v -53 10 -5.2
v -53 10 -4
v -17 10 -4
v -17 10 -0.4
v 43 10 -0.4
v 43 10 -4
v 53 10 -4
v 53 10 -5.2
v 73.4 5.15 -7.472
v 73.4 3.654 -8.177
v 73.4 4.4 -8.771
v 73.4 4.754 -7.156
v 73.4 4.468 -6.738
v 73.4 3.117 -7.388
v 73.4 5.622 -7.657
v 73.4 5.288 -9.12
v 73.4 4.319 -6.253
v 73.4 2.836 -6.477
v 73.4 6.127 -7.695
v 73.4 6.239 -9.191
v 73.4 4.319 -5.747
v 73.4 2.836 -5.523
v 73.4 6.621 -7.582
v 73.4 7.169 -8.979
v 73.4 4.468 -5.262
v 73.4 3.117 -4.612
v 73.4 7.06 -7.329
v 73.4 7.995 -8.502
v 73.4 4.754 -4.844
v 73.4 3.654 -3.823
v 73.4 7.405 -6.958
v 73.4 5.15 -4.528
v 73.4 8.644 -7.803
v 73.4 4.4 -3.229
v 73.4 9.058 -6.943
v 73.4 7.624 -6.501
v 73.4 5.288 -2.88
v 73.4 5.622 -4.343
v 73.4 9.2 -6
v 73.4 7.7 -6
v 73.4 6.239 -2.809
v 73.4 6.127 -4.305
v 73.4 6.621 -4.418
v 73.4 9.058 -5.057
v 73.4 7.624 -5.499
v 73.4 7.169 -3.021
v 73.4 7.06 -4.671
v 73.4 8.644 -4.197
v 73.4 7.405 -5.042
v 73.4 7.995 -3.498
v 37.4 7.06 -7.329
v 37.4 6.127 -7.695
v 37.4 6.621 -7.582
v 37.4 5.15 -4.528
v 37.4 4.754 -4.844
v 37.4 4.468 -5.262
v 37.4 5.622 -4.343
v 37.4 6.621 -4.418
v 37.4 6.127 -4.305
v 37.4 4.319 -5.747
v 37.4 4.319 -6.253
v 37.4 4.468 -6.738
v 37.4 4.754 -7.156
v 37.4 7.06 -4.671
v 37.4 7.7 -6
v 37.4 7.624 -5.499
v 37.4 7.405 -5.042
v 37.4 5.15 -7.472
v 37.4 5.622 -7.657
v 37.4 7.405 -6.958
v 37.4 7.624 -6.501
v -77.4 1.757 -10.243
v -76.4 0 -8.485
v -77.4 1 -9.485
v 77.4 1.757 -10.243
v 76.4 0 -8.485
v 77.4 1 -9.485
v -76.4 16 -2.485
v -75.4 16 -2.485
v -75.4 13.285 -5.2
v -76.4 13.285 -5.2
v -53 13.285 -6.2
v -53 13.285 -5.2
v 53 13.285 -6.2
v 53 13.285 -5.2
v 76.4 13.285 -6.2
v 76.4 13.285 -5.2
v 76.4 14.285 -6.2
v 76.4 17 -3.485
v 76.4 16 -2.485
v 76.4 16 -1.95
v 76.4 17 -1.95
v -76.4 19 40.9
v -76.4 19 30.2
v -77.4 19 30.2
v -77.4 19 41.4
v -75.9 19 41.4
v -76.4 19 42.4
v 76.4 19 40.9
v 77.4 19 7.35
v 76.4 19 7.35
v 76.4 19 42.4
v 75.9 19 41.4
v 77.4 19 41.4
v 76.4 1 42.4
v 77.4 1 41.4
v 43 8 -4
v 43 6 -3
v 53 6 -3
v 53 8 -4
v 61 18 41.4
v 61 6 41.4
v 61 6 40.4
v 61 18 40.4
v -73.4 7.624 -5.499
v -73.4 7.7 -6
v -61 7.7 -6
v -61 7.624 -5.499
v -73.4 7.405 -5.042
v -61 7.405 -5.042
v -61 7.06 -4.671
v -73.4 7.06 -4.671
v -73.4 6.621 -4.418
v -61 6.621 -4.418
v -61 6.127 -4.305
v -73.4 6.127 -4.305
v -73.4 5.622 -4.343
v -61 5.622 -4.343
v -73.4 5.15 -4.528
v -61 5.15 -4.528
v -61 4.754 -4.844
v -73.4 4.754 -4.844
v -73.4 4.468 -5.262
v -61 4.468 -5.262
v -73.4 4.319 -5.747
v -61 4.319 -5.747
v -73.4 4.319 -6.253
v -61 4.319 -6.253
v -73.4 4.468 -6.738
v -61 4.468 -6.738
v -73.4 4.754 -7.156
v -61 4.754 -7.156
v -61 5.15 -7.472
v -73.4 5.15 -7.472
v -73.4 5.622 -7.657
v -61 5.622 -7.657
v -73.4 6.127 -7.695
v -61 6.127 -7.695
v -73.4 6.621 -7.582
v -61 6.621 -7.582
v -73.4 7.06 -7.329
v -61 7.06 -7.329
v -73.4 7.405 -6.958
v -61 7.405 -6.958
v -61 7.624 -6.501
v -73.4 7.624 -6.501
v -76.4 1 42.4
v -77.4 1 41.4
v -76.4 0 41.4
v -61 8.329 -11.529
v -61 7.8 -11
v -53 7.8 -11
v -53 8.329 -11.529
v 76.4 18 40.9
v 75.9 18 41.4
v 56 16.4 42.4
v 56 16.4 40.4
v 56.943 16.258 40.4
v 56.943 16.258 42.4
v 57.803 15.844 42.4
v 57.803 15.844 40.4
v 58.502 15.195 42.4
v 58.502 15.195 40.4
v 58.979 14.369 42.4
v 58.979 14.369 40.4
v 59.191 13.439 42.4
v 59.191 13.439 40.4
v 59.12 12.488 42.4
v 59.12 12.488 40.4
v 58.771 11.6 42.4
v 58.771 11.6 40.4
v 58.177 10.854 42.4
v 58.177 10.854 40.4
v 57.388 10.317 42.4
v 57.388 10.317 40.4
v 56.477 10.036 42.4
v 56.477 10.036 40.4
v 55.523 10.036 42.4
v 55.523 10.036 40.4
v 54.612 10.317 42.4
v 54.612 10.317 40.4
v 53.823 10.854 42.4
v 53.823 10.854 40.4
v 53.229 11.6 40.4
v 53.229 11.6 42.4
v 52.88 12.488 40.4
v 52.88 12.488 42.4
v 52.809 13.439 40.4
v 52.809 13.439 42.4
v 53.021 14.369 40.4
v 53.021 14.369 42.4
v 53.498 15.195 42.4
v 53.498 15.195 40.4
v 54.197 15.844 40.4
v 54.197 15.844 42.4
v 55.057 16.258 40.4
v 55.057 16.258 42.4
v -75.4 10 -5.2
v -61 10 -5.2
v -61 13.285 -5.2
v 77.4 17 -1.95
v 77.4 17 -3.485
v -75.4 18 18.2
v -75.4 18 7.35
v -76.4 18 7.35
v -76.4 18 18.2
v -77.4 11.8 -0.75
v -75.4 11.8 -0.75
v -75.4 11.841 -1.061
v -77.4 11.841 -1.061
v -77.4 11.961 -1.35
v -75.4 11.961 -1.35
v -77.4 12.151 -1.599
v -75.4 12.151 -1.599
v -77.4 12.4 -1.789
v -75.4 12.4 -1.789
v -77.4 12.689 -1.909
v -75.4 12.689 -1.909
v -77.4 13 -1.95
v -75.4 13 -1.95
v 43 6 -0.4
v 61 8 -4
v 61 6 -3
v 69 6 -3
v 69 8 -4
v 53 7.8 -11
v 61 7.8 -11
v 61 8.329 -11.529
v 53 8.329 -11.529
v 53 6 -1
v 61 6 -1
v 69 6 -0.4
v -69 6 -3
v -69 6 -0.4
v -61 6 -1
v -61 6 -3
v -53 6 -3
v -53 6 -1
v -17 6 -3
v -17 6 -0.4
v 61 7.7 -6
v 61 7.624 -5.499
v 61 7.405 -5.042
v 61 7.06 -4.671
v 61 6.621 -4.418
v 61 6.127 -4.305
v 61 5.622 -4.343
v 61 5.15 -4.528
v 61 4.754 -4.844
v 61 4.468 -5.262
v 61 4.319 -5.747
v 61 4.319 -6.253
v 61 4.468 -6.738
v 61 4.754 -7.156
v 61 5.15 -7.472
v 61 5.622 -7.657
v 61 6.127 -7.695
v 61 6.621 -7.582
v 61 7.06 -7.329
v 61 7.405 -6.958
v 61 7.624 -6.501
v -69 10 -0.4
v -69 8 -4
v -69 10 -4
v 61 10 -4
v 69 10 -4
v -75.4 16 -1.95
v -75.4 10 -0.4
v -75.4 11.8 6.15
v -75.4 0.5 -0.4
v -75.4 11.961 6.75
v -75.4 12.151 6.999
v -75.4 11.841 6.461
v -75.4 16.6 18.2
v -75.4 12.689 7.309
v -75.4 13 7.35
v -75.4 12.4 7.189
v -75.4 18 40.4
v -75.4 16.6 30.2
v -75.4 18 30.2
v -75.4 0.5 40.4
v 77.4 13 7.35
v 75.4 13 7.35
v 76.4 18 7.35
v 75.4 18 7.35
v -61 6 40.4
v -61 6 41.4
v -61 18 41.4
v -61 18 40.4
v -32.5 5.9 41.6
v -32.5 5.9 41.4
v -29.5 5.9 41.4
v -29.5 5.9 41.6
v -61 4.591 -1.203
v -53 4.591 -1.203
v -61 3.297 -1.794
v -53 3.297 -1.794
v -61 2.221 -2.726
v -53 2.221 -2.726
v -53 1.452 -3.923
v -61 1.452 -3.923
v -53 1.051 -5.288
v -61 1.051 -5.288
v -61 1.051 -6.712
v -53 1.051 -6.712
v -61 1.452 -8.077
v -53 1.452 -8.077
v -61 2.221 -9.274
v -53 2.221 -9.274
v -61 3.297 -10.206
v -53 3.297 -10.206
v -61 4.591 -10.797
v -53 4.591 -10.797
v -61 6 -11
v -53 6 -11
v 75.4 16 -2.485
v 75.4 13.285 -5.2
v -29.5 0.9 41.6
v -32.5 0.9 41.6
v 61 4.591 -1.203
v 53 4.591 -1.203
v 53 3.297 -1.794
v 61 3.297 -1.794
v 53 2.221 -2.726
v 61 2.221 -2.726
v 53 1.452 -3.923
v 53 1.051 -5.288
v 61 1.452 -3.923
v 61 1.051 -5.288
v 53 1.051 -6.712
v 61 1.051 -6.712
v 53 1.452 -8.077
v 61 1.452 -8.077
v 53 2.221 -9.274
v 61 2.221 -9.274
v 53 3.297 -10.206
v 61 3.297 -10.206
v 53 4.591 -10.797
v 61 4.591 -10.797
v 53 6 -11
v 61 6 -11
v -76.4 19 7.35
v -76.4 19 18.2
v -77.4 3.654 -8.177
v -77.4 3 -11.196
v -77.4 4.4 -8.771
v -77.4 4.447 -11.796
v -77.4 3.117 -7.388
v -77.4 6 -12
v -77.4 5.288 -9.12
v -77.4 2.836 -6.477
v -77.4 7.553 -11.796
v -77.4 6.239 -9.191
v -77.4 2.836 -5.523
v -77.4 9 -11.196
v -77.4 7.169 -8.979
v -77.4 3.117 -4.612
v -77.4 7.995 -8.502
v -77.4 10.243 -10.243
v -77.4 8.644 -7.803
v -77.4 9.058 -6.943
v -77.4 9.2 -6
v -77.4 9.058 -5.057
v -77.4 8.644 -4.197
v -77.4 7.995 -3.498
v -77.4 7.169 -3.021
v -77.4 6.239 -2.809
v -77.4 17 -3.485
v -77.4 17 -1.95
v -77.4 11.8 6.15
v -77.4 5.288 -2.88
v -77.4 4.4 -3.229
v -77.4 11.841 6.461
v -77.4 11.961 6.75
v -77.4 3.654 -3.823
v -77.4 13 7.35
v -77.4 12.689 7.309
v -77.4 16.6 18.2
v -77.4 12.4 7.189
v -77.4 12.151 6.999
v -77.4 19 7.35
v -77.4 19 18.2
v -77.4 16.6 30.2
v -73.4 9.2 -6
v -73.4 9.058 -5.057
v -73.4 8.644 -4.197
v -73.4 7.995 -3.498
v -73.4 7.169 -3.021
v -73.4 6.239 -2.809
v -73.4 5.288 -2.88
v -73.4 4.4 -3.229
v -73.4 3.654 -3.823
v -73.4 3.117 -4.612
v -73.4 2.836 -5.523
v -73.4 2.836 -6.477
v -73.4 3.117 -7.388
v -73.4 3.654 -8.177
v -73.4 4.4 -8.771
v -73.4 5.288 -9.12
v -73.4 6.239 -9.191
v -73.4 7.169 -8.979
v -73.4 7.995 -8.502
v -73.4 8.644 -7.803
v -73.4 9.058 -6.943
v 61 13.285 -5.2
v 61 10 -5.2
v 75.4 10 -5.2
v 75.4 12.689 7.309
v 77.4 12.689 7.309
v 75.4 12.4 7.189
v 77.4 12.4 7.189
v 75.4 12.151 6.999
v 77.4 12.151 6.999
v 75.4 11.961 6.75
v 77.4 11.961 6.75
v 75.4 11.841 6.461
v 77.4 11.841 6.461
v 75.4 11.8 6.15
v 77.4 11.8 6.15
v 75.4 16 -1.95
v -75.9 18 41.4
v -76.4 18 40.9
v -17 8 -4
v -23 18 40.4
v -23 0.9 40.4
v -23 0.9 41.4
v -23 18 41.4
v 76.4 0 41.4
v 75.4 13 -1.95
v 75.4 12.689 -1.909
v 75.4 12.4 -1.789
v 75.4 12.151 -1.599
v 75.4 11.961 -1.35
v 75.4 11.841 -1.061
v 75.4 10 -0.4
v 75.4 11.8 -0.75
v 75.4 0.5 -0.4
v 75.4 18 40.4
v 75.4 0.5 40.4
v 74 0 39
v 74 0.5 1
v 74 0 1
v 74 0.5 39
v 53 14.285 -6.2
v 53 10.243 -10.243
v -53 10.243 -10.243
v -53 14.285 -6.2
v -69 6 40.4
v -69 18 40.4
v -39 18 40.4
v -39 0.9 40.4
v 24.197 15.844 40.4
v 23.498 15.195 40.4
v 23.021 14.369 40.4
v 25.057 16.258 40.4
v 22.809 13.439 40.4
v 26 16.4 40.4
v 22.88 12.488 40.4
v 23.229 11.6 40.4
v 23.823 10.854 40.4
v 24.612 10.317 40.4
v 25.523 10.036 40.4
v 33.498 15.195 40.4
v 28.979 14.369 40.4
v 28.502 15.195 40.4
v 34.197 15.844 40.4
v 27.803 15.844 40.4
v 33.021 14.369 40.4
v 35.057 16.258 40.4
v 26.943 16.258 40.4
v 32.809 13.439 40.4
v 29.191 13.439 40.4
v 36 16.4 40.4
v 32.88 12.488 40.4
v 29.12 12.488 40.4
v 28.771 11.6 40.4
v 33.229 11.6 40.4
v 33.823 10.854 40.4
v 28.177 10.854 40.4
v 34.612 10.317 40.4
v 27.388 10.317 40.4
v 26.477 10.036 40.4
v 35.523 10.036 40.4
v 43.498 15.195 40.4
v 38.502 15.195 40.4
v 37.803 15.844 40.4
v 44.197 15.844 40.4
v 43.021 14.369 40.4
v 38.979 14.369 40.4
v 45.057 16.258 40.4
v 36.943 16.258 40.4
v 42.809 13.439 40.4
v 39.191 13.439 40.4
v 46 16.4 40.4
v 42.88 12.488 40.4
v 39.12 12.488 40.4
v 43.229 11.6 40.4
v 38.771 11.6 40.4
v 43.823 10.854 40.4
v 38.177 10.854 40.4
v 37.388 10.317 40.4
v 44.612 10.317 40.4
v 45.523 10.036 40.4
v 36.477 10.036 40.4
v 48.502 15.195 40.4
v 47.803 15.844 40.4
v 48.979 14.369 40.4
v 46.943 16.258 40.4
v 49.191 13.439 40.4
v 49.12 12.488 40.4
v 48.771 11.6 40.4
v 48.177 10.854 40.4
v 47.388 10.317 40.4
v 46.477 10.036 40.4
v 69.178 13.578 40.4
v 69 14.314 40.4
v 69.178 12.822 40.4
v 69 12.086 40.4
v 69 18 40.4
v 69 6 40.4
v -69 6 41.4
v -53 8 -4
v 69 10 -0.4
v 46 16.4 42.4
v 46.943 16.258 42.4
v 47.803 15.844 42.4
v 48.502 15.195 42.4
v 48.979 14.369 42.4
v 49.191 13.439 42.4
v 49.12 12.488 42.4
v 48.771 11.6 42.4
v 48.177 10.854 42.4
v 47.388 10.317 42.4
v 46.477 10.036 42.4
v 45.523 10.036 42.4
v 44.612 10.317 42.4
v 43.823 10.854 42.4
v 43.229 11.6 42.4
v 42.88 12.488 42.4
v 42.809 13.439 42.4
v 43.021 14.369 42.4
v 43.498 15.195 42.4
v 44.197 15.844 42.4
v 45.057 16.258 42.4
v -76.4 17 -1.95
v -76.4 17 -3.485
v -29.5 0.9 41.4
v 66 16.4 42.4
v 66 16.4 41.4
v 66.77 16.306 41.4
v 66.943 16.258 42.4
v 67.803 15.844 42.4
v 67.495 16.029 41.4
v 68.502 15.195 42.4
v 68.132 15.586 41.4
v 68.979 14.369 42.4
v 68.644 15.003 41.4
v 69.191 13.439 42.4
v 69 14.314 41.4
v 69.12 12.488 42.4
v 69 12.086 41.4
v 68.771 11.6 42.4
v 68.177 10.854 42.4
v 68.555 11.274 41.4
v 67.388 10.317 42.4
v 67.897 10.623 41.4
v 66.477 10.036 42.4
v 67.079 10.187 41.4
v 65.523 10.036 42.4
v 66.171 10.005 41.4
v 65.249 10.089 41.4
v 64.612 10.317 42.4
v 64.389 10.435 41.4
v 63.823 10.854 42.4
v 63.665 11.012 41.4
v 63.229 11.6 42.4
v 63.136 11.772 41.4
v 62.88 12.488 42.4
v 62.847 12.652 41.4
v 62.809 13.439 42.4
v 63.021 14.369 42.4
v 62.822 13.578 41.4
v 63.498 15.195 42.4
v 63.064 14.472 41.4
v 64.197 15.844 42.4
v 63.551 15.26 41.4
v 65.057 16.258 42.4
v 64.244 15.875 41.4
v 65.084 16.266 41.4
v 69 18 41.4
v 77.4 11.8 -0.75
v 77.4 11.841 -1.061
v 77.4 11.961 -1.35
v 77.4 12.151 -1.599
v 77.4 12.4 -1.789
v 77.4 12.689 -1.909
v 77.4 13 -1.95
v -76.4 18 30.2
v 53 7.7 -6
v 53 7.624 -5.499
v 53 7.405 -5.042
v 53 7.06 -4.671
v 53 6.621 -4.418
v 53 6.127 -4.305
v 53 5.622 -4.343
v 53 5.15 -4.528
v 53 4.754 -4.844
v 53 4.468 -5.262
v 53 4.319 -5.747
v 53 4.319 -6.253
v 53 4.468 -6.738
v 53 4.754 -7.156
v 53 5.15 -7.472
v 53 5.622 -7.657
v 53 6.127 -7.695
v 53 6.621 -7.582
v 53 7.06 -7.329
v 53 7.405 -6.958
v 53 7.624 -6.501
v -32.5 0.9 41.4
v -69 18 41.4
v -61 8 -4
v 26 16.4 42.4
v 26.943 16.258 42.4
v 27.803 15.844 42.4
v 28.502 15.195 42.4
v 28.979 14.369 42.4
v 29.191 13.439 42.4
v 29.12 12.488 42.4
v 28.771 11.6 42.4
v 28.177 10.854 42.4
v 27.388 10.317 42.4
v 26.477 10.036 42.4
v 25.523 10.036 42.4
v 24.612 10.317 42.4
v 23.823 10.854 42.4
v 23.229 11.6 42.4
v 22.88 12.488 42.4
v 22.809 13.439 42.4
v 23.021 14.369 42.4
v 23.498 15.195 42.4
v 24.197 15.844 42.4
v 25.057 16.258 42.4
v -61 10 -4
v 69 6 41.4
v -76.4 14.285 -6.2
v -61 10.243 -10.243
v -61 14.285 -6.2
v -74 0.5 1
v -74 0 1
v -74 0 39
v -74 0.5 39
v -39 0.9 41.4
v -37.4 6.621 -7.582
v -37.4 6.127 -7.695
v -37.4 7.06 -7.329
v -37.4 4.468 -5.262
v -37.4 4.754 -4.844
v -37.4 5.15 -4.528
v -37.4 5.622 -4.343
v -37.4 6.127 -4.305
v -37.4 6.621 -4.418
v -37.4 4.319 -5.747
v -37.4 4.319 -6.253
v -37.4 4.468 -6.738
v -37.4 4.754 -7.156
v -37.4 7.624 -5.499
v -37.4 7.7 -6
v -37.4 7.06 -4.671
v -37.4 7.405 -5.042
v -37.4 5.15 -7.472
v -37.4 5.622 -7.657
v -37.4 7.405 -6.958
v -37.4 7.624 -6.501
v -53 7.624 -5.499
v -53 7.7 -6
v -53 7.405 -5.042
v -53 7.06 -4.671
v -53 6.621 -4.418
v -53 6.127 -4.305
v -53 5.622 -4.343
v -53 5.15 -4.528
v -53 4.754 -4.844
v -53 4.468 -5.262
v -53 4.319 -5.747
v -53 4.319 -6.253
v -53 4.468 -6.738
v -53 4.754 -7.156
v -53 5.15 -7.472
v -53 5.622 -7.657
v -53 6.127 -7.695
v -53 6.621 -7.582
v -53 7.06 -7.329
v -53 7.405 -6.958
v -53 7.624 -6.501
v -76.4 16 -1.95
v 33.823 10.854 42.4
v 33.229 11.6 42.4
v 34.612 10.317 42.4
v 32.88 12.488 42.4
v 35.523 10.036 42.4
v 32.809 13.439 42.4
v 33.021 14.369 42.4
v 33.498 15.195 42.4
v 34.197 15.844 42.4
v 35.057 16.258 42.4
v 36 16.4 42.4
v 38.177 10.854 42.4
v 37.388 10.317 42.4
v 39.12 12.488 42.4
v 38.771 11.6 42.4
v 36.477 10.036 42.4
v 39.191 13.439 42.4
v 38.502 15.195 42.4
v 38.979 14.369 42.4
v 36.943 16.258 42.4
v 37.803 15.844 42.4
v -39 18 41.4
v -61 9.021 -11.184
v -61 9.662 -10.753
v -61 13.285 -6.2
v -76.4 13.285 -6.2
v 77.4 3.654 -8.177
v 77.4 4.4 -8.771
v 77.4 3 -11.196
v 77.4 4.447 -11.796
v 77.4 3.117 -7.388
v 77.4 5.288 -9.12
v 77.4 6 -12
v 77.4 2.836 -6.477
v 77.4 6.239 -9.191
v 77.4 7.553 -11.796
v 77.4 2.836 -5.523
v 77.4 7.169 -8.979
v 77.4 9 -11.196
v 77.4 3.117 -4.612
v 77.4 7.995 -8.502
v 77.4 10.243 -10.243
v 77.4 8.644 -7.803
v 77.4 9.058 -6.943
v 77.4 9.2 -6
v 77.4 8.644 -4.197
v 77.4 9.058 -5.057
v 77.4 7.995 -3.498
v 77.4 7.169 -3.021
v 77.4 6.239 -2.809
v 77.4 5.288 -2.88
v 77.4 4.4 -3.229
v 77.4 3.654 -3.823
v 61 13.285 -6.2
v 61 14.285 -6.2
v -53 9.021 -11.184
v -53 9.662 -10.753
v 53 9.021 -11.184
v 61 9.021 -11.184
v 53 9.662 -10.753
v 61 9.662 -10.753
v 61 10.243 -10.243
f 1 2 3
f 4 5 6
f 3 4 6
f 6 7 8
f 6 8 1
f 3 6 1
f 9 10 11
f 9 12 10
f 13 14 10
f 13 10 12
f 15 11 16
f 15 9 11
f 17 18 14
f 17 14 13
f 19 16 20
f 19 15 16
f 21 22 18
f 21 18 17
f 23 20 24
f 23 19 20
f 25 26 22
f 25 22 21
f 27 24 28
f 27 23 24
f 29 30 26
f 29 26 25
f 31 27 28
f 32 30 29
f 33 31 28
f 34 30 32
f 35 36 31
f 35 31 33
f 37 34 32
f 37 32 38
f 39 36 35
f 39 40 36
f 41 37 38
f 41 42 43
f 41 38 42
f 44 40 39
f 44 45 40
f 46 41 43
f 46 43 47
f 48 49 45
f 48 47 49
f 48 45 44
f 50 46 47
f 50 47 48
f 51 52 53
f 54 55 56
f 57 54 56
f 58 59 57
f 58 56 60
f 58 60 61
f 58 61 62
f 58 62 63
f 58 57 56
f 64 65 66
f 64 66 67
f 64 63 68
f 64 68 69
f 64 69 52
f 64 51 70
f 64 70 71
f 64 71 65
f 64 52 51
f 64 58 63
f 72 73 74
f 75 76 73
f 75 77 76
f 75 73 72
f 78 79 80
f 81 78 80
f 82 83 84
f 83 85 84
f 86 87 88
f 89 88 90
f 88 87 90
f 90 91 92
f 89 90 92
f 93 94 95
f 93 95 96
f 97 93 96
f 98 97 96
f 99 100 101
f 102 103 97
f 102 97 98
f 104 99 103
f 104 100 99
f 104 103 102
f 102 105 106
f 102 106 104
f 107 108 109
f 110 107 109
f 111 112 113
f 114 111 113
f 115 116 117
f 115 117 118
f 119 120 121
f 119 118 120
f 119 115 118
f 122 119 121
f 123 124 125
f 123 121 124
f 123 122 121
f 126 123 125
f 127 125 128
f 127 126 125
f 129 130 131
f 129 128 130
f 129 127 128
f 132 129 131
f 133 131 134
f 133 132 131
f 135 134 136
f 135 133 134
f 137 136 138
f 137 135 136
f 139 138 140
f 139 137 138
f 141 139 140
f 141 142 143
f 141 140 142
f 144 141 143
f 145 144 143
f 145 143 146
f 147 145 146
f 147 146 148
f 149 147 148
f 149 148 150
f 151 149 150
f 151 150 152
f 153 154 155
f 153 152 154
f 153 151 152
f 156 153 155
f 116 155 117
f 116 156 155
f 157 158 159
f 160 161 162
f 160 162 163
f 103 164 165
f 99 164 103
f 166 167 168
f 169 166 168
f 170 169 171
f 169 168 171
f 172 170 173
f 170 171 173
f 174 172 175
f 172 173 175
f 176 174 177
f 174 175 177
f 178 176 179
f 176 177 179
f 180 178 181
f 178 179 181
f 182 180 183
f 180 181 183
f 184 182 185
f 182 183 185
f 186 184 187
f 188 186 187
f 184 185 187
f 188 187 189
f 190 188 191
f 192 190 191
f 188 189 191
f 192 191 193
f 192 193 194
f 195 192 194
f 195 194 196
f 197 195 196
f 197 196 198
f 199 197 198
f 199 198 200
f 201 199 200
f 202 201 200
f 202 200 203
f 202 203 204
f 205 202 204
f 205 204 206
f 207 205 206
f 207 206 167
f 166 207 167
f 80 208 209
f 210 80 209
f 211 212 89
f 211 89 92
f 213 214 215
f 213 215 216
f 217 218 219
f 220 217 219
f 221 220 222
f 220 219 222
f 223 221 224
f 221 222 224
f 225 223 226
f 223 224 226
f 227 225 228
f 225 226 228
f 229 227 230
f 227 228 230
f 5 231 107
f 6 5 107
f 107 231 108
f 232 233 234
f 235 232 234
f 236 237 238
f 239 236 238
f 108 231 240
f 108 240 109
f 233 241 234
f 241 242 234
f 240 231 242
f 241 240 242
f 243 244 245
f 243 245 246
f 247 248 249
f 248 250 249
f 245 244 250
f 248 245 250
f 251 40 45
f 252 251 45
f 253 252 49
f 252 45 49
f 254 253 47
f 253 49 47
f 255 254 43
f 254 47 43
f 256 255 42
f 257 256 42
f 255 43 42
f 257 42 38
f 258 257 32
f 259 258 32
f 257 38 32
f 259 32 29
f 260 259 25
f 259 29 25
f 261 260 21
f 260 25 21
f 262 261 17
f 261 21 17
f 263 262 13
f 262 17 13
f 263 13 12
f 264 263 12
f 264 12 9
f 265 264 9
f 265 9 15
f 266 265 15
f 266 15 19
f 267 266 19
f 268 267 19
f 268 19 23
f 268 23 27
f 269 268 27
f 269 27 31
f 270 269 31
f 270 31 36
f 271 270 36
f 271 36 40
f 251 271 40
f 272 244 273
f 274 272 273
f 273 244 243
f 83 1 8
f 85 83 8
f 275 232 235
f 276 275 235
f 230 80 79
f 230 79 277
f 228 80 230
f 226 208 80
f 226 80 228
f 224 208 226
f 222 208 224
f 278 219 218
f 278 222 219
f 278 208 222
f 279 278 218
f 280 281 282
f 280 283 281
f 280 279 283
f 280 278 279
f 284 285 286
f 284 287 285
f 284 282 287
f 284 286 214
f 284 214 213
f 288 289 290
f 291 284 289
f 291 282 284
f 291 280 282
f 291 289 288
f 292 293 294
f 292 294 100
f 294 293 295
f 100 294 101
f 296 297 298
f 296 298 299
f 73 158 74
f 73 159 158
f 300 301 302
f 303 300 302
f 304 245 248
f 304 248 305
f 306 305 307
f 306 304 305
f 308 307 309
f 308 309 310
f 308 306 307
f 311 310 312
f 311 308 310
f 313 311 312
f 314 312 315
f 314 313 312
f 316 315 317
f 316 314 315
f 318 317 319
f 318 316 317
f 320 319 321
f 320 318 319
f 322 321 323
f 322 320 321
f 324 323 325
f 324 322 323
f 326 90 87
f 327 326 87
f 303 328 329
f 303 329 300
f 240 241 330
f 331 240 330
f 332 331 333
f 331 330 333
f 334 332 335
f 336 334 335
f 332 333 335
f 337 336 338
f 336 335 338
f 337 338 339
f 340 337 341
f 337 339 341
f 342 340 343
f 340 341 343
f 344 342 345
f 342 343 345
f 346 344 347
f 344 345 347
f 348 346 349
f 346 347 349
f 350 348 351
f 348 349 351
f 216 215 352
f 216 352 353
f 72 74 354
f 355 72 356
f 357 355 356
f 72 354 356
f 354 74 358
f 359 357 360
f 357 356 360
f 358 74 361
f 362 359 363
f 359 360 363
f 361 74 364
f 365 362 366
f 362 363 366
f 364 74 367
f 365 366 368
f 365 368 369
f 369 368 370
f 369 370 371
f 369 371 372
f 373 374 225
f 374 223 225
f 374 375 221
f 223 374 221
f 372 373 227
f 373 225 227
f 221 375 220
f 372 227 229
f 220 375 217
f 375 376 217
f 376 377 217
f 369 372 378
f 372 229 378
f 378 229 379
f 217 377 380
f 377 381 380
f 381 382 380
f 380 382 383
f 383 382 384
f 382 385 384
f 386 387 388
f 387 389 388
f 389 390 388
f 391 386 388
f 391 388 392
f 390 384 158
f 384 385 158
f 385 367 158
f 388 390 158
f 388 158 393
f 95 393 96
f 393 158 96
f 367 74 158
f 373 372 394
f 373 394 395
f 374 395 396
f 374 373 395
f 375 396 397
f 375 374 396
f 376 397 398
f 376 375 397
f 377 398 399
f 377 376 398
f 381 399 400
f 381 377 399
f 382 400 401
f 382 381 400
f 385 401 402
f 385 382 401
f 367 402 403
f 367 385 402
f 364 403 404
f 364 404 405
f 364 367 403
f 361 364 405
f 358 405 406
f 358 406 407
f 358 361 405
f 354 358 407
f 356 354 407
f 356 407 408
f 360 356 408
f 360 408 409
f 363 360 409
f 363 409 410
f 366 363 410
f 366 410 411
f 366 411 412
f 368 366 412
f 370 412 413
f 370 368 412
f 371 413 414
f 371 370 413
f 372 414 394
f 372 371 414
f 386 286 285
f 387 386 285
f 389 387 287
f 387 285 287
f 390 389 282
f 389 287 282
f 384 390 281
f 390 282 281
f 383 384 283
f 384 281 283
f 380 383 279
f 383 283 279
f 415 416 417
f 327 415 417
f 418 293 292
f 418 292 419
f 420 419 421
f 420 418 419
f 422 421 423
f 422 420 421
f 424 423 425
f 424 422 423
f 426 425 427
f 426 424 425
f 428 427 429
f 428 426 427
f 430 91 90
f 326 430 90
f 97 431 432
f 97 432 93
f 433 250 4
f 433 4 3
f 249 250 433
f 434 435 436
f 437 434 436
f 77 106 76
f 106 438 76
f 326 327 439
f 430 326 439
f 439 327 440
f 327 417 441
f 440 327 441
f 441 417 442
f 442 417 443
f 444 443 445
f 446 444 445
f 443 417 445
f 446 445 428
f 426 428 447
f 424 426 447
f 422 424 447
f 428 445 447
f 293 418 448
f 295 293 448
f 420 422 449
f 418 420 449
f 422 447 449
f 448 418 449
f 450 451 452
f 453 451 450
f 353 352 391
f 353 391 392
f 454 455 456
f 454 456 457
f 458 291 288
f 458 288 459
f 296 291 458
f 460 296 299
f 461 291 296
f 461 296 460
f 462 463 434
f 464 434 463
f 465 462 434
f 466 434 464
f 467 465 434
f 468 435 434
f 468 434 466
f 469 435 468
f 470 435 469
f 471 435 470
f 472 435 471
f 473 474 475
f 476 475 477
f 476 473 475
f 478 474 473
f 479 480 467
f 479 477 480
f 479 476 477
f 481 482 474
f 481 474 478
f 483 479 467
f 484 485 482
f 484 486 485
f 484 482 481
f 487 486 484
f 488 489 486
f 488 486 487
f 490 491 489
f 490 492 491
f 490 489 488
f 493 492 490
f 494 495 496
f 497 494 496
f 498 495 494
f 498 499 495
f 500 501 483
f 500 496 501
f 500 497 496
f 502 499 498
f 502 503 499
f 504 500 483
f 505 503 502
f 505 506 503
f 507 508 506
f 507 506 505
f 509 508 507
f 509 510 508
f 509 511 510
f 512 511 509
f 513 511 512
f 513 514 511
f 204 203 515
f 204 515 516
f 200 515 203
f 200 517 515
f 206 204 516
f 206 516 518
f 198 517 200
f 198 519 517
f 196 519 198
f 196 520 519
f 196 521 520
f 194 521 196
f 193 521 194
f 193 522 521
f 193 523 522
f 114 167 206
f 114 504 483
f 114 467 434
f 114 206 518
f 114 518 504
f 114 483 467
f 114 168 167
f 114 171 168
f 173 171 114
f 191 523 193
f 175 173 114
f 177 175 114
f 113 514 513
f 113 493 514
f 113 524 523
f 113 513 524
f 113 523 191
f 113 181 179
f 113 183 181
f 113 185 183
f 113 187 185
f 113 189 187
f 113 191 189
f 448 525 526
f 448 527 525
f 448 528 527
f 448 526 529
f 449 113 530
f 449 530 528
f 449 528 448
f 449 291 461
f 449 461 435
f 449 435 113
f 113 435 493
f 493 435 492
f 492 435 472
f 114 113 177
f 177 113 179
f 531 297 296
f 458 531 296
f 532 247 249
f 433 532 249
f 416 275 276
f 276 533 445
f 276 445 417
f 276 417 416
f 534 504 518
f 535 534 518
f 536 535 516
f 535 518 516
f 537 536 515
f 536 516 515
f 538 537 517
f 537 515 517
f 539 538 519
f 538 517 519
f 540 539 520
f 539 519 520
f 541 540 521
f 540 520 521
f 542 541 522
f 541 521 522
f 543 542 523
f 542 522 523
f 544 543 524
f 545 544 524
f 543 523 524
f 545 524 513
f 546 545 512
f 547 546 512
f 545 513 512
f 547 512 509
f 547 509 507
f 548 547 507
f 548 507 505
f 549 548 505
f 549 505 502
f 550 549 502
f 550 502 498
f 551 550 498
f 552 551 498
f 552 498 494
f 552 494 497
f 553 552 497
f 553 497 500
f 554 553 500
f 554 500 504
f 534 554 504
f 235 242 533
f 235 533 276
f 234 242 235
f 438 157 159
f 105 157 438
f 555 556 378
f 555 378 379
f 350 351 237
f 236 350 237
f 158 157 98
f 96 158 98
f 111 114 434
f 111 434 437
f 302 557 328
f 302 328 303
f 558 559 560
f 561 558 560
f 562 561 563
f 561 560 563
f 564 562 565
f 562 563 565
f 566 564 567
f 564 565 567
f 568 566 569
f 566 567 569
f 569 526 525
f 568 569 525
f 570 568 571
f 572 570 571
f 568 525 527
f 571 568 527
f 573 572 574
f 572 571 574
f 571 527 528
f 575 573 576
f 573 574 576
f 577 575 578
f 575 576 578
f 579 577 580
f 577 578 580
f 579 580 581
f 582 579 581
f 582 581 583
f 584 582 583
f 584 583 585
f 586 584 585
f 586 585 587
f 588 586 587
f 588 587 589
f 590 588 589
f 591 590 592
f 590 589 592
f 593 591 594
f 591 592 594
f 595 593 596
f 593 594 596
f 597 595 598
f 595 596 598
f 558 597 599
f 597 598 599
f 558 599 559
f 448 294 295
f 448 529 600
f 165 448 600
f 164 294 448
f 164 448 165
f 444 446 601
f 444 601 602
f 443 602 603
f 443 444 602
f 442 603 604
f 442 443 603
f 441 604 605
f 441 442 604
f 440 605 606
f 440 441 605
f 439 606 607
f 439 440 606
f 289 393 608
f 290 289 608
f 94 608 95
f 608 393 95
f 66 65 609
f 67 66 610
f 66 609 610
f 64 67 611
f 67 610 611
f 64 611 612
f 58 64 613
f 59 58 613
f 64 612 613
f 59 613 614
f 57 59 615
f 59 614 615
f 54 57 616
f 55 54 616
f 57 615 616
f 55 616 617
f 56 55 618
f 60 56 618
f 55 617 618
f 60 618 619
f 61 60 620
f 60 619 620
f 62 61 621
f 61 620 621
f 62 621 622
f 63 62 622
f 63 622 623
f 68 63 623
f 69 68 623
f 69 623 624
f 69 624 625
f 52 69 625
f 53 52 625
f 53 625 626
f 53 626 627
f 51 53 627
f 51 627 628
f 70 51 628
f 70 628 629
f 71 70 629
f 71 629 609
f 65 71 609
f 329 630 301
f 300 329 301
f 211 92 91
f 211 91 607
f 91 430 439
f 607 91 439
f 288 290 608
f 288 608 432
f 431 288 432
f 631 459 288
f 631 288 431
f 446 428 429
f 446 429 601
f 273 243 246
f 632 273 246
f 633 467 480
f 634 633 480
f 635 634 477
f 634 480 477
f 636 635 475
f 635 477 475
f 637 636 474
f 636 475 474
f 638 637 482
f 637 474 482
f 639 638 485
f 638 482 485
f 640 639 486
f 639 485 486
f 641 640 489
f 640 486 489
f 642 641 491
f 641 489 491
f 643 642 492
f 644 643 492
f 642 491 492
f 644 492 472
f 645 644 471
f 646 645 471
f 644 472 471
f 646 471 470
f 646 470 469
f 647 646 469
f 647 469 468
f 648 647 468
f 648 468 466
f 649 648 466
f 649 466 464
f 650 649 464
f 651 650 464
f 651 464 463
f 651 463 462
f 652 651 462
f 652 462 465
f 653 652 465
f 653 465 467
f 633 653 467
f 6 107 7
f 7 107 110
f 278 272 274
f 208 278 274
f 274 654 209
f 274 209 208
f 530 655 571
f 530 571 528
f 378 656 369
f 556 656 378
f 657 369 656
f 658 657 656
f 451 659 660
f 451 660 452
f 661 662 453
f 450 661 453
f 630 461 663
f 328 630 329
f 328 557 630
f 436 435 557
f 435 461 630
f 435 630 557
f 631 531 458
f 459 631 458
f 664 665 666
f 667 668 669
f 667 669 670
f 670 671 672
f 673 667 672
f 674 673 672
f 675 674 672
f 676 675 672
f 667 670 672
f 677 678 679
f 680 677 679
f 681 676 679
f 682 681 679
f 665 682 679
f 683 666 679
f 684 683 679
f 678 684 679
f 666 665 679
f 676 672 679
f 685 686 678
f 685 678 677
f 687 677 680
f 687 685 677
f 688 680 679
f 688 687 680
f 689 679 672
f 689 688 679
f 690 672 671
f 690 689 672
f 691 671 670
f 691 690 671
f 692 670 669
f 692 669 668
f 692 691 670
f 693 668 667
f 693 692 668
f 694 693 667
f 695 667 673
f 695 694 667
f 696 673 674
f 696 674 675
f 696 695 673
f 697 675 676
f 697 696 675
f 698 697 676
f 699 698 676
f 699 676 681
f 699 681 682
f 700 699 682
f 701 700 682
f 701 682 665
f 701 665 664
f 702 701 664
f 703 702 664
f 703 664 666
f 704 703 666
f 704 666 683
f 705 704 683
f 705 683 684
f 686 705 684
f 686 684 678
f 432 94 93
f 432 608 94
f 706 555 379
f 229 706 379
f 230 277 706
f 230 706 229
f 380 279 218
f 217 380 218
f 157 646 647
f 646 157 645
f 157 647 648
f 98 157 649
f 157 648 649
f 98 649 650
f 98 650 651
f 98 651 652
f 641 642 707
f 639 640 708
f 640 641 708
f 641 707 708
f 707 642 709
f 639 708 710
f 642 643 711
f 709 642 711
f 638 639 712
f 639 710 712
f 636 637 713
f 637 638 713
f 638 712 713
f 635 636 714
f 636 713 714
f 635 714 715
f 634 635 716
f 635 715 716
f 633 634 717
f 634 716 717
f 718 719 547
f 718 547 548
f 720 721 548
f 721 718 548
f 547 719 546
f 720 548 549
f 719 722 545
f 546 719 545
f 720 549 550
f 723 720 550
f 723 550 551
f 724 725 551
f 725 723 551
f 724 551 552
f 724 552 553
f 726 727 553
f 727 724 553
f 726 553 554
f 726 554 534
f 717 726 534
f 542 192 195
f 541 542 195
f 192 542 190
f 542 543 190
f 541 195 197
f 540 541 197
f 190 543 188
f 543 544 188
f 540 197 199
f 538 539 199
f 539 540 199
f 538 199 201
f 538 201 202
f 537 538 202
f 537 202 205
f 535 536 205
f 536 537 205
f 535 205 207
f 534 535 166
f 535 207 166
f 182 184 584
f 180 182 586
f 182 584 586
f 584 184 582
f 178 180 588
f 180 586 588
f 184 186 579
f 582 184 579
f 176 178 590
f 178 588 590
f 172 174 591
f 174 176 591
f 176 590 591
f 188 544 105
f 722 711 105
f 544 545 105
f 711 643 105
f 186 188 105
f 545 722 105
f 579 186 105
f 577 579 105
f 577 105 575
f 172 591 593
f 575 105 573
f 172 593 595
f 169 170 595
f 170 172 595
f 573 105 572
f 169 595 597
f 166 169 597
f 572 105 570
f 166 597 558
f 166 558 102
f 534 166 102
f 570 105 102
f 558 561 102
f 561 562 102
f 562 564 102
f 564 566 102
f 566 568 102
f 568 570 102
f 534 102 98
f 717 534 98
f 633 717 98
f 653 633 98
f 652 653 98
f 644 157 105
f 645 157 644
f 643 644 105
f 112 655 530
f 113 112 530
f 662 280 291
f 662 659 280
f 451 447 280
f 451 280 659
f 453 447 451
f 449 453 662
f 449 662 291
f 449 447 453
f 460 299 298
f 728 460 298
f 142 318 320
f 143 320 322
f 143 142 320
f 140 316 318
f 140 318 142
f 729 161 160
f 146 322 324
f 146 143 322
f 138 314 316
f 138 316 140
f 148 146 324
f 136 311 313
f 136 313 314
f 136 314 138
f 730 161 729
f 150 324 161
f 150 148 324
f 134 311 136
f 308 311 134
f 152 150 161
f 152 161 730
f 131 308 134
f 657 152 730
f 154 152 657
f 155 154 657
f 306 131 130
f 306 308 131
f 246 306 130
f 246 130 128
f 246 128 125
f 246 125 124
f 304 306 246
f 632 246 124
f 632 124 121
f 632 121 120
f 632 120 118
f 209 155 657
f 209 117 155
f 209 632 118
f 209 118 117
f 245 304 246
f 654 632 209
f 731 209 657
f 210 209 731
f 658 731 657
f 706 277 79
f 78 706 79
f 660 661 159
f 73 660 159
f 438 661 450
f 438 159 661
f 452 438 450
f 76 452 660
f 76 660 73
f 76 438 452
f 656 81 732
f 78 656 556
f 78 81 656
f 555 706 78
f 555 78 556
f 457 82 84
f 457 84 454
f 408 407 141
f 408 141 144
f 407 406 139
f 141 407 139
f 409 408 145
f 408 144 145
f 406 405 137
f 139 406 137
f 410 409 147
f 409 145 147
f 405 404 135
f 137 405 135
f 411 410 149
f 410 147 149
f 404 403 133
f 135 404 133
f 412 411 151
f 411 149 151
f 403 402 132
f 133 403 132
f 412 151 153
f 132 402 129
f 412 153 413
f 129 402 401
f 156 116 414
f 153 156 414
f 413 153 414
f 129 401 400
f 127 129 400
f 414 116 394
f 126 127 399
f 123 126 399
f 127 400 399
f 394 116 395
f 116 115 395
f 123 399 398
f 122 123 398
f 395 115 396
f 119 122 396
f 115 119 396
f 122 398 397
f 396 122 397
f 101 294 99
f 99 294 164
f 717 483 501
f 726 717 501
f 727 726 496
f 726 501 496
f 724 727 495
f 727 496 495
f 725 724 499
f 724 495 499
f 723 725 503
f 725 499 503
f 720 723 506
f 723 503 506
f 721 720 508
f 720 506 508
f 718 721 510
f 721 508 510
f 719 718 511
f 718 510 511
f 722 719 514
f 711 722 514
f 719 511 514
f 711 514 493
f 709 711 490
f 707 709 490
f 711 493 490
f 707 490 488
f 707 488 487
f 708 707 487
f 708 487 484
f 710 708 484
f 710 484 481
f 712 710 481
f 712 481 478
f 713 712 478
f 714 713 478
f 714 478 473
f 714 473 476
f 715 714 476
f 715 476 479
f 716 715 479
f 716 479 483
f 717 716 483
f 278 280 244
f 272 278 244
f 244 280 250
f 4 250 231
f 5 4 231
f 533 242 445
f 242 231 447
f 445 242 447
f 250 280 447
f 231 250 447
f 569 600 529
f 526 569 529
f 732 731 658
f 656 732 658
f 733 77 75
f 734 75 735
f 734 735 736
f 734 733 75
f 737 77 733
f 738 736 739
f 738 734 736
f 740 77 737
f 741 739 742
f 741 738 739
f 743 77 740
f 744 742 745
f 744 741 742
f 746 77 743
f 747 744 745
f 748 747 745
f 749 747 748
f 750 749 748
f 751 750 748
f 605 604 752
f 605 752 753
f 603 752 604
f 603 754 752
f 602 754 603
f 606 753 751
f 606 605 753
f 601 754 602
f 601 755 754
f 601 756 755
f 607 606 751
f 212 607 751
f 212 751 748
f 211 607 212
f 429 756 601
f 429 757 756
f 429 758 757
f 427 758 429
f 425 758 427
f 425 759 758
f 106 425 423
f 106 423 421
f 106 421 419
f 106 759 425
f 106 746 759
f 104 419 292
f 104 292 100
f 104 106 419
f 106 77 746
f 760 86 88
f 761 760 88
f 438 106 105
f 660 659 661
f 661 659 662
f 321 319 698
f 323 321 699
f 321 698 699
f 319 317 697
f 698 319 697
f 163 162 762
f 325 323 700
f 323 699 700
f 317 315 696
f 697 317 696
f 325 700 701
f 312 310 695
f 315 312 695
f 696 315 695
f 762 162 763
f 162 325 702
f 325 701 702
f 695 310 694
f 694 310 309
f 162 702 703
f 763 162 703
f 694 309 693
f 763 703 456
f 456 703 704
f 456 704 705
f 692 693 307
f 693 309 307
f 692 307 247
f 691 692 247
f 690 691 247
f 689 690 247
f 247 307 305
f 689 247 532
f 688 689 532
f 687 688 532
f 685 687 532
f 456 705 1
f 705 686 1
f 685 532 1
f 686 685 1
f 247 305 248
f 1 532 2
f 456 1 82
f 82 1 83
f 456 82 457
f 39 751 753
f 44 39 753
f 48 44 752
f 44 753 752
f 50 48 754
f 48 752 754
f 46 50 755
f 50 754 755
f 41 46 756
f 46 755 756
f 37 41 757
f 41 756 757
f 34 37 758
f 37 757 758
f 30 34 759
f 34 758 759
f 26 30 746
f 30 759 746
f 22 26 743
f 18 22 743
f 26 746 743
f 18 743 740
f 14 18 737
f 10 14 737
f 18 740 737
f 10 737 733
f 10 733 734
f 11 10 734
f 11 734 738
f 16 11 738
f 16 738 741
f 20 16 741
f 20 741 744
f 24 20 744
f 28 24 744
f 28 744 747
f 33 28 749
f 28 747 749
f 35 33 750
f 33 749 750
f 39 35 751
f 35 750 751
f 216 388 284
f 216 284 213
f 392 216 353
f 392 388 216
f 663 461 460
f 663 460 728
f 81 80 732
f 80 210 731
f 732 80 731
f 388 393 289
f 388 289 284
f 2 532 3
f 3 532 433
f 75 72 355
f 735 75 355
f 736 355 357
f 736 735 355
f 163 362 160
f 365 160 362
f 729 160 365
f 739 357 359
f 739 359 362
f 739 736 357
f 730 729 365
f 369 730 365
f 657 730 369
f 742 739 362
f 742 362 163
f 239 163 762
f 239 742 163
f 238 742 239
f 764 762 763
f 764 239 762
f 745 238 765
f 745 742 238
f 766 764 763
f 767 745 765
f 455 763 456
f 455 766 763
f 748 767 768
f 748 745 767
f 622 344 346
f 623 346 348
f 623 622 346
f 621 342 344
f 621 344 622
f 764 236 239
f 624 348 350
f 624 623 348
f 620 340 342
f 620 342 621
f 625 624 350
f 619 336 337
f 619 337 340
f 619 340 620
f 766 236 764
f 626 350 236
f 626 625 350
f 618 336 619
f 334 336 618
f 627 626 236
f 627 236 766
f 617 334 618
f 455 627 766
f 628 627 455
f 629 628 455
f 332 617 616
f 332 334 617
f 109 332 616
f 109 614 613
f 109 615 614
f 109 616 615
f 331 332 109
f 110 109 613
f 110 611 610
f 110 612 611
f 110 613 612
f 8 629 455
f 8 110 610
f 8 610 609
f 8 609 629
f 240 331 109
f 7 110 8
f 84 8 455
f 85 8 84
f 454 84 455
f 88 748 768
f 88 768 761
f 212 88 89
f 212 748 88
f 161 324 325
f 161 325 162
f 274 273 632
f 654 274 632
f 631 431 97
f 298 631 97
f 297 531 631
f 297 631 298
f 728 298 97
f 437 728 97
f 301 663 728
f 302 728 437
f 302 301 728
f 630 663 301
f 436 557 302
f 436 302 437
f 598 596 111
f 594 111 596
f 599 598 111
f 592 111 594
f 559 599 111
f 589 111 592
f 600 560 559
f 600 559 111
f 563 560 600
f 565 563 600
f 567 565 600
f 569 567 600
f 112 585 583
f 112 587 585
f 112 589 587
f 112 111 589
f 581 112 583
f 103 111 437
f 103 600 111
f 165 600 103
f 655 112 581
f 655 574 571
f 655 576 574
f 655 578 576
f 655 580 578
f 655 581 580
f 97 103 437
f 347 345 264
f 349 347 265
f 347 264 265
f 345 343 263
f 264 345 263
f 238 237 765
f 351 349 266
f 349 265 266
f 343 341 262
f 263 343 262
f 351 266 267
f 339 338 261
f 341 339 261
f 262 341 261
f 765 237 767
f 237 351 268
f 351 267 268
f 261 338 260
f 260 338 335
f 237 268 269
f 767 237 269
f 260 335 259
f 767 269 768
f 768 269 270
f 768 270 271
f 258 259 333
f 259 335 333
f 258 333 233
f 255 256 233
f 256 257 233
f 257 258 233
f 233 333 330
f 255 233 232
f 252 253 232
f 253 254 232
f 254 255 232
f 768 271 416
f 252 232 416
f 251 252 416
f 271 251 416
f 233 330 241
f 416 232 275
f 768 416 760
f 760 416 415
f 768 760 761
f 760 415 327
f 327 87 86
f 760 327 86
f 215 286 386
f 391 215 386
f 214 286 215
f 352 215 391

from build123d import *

# Parameters (mm, degrees)
PAD_DEPTH            = 77.4
SKETCH002_W          = 40
SKETCH002_H          = 150
POCKET_DEPTH         = 18.501
SKETCH005_W          = 38
SKETCH005_H          = 148
POCKET003_DEPTH      = 0.501
SKETCH021_W          = 40.8
SKETCH021_H          = 150.8
POCKET018_DEPTH      = 18.501
SKETCH003_W          = 4
SKETCH003_H          = 8
SKETCH003_H_2        = 10
SKETCH003_H_3        = 36
SKETCH003_W_2        = 1.4
POCKET001_DEPTH      = 13.001
CHAMFER_1_SIZE2      = 1
CHAMFER_1_SIZE       = 2
CHAMFER_2_SIZE2      = 1
CHAMFER_2_SIZE       = 2
CHAMFER_3_SIZE2      = 1
CHAMFER_3_SIZE       = 2
CHAMFER_4_SIZE2      = 1
CHAMFER_4_SIZE       = 2
SKETCH004_W          = 4.8
SKETCH004_H          = 150
POCKET002_DEPTH      = 9.001
SKETCH022_W          = 5.2
SKETCH022_H          = 150.8
POCKET019_DEPTH      = 9.001
POCKET009_DEPTH      = 8
SKETCH013_R          = 1.7
POCKET010_DEPTH      = 40
SKETCH014_R          = 3.2
POCKET011_DEPTH      = 4
SKETCH006_W          = 1
SKETCH006_H          = 16
POCKET004_DEPTH      = 17.1
SKETCH020_W          = 5
SKETCH020_H          = 3
POCKET017_DEPTH      = 0.2
POCKET005_DEPTH      = 77.401
POCKET005_DEPTH_BACK = 77.401
SKETCH016_W          = 5
SKETCH016_H          = 12
POCKET012_DEPTH      = 10
SKETCH008_W          = 40
SKETCH008_H          = 152.8
POCKET006_DEPTH      = 1.001
SKETCH023_W          = 30
SKETCH023_H          = 170
POCKET020_DEPTH      = 2
POCKET007_DEPTH      = 76.4
SKETCH010_R          = 3.2
POCKET008_DEPTH      = 2.401
CHAMFER001_SIZE      = 1
CHAMFER002_SIZE      = 0.5


with BuildPart() as part:
    # Sketch001 → Pad (new body, symmetric)
    with BuildSketch(Plane.YZ):
        with BuildLine():
            Line((19, -1.485281), (19, 42.4))
            Line((0, 42.4), (19, 42.4))
            Line((0, 42.4), (0, 0))
            Line((0, 0), (0, -8.485281))
            Line((0, -8.485281), (1.757359, -10.242641))
            ThreePointArc((1.757359, -10.242641), (6, -12), (10.242641, -10.242641))
            Line((10.242641, -10.242641), (19, -1.485281))
        make_face()
    extrude(amount=PAD_DEPTH, both=True)

    # Sketch002 (on Face3 of Pad) → Pocket (cut, through all)
    with BuildSketch(Plane(origin=(0, 0.5, 0), x_dir=(0, 0, -1), z_dir=(0, -1, 0))):
        with Locations((-20, 0)):
            Rectangle(SKETCH002_W, SKETCH002_H)
    extrude(amount=-POCKET_DEPTH, mode=Mode.SUBTRACT)

    # Sketch005 (on Face14 of Pocket) → Pocket003 (cut, through all)
    with BuildSketch(Plane.ZX.offset(0.5)):
        with Locations((20, 0)):
            Rectangle(SKETCH005_W, SKETCH005_H)
    extrude(amount=-POCKET003_DEPTH, mode=Mode.SUBTRACT)

    # Sketch021 (on Face14 of Pocket) → Pocket018 (cut, through all)
    with BuildSketch(Plane.ZX.offset(0.5)):
        with Locations((20, 0)):
            Rectangle(SKETCH021_W, SKETCH021_H)
    extrude(amount=POCKET018_DEPTH, mode=Mode.SUBTRACT)

    # Sketch003 (on Face3 of Pad) → Pocket001 (cut, through all)
    with BuildSketch(Plane(origin=(0, 6, 0), x_dir=(0, 0, -1), z_dir=(0, -1, 0))):
        with Locations((2, 65)):
            Rectangle(SKETCH003_W, SKETCH003_H)
        with Locations((2, 48)):
            Rectangle(SKETCH003_W, SKETCH003_H_2)
        with Locations((2, -35)):
            Rectangle(SKETCH003_W, SKETCH003_H_3)
        with Locations((2, -65)):
            Rectangle(SKETCH003_W, SKETCH003_H)
        with Locations((-40.7, 65)):
            Rectangle(SKETCH003_W_2, SKETCH003_H)
        with Locations((-40.7, -65)):
            Rectangle(SKETCH003_W_2, SKETCH003_H)
    extrude(amount=-POCKET001_DEPTH, mode=Mode.SUBTRACT)

    # Chamfer 1
    chamfer_1_edges = [part.edges().sort_by_distance(p)[0] for p in [
        (65, 6, -4),
    ]]
    chamfer_1_side = part.faces().sort_by_distance((65, 11.242641, -4))[0]
    chamfer(chamfer_1_edges, length=CHAMFER_1_SIZE, length2=CHAMFER_1_SIZE2, reference=chamfer_1_side)

    # Chamfer 2
    chamfer_2_edges = [part.edges().sort_by_distance(p)[0] for p in [
        (48, 6, -4),
    ]]
    chamfer_2_side = part.faces().sort_by_distance((48, 11.242641, -4))[0]
    chamfer(chamfer_2_edges, length=CHAMFER_2_SIZE, length2=CHAMFER_2_SIZE2, reference=chamfer_2_side)

    # Chamfer 3
    chamfer_3_edges = [part.edges().sort_by_distance(p)[0] for p in [
        (-35, 6, -4),
    ]]
    chamfer_3_side = part.faces().sort_by_distance((-35, 11.242641, -4))[0]
    chamfer(chamfer_3_edges, length=CHAMFER_3_SIZE, length2=CHAMFER_3_SIZE2, reference=chamfer_3_side)

    # Chamfer 4
    chamfer_4_edges = [part.edges().sort_by_distance(p)[0] for p in [
        (-65, 6, -4),
    ]]
    chamfer_4_side = part.faces().sort_by_distance((-65, 11.242641, -4))[0]
    chamfer(chamfer_4_edges, length=CHAMFER_4_SIZE, length2=CHAMFER_4_SIZE2, reference=chamfer_4_side)

    # Sketch004 (on Face3 of Pad) → Pocket002 (cut, through all)
    with BuildSketch(Plane(origin=(0, 10, 0), x_dir=(0, 0, -1), z_dir=(0, -1, 0))):
        with Locations((2.4, 0)):
            Rectangle(SKETCH004_W, SKETCH004_H)
    extrude(amount=-POCKET002_DEPTH, mode=Mode.SUBTRACT)

    # Sketch022 (on Face4 of Pocket002) → Pocket019 (cut, through all)
    with BuildSketch(Plane.ZX.offset(10)):
        with Locations((-2.6, 0)):
            Rectangle(SKETCH022_W, SKETCH022_H)
    extrude(amount=POCKET019_DEPTH, mode=Mode.SUBTRACT)

    # Sketch011 (on Face33 of Pocket001) → Pocket009 (cut)
    with BuildSketch(Plane.YZ.offset(61)):
        with BuildLine():
            ThreePointArc((6, -1), (1, -6), (6, -11))
            Line((6, -11), (7.8, -11))
            Line((7.8, -11), (8.8, -12))
            Line((8.8, -12), (21, -12))
            Line((21, 4), (21, -12))
            Line((6, 4), (21, 4))
            Line((6, -1), (6, 4))
        make_face()
    pocket009 = extrude(amount=-POCKET009_DEPTH, mode=Mode.SUBTRACT)

    # Sketch013 (on Face9 of Pad) → Pocket010 (cut)
    with BuildSketch(Plane.YZ.offset(77.4)):
        with Locations((6, -6)):
            Circle(SKETCH013_R)
    pocket010 = extrude(amount=-POCKET010_DEPTH, mode=Mode.SUBTRACT)

    # Sketch014 (on Face9 of Pad) → Pocket011 (cut)
    with BuildSketch(Plane.YZ.offset(77.4)):
        with Locations((6, -6)):
            Circle(SKETCH014_R)
    pocket011 = extrude(amount=-POCKET011_DEPTH, mode=Mode.SUBTRACT)

    # Mirrored: Pocket011, Pocket010, Pocket009 across YZ
    add(pocket011.mirror(Plane.YZ), mode=Mode.SUBTRACT)
    add(pocket010.mirror(Plane.YZ), mode=Mode.SUBTRACT)
    add(pocket009.mirror(Plane.YZ), mode=Mode.SUBTRACT)

    # Sketch006 (on Face14 of Pocket) → Pocket004 (cut)
    with BuildSketch(Plane.ZX.offset(0.9)):
        with Locations((40.9, -31)):
            Rectangle(SKETCH006_W, SKETCH006_H)
    extrude(amount=POCKET004_DEPTH, mode=Mode.SUBTRACT)

    # Sketch020 (on Face82 of Pocket004) → Pocket017 (cut)
    with BuildSketch(Plane.YX.offset(-41.4)):
        with Locations((3.4, -31)):
            Rectangle(SKETCH020_W, SKETCH020_H)
    extrude(amount=-POCKET017_DEPTH, mode=Mode.SUBTRACT)

    # Sketch007 → Pocket005 (cut, two sides)
    with BuildSketch(Plane.YZ) as pocket005_sk:
        with BuildLine():
            Line((13, 7.35), (21.8, 7.35))
            Line((21.8, 7.35), (21.8, -1.95))
            Line((21.8, -1.95), (13, -1.95))
            ThreePointArc((11.8, -0.75), (12.151472, -1.598528), (13, -1.95))
            Line((11.8, 6.15), (11.8, -0.75))
            ThreePointArc((13, 7.35), (12.151472, 6.998528), (11.8, 6.15))
        make_face()
    extrude(amount=-POCKET005_DEPTH, mode=Mode.SUBTRACT)
    extrude(pocket005_sk.sketch, amount=POCKET005_DEPTH_BACK, mode=Mode.SUBTRACT)

    # Sketch016 (on Face8 of Pad) → Pocket012 (cut)
    with BuildSketch(Plane(origin=(-77.4, 0, 0), x_dir=(0, 1, 0), z_dir=(-1, 0, 0))):
        with Locations((19.1, -24.2)):
            Rectangle(SKETCH016_W, SKETCH016_H)
    extrude(amount=-POCKET012_DEPTH, mode=Mode.SUBTRACT)

    # Sketch008 (on Face1 of Pad) → Pocket006 (cut, through all)
    with BuildSketch(Plane.ZX.offset(18)):
        with Locations((21.4, 0)):
            Rectangle(SKETCH008_W, SKETCH008_H)
    extrude(amount=POCKET006_DEPTH, mode=Mode.SUBTRACT)

    # Sketch023 (on Face1 of Pad) → Pocket020 (cut)
    with BuildSketch(Plane.ZX.offset(19)):
        with Locations((-15, 0)):
            Rectangle(SKETCH023_W, SKETCH023_H)
    extrude(amount=-POCKET020_DEPTH, mode=Mode.SUBTRACT)

    # Sketch009 → Pocket007 (cut, symmetric)
    with BuildSketch(Plane.YZ):
        Polygon((13.285281, -6.2), (23.285281, -6.2), (23.285281, 6.8), (16, -0.485281), (16, -2.485281), (13.285281, -5.2), align=None)
    extrude(amount=POCKET007_DEPTH, both=True, mode=Mode.SUBTRACT)

    # Sketch010 (on Face7 of Pocket) → Pocket008 (cut, through all)
    with BuildSketch(Plane.YX.offset(-40)):
        with Locations((13.2, 66)):
            Circle(SKETCH010_R)
        with Locations((13.2, 56)):
            Circle(SKETCH010_R)
        with Locations((13.2, 46)):
            Circle(SKETCH010_R)
        with Locations((13.2, 36)):
            Circle(SKETCH010_R)
        with Locations((13.2, 26)):
            Circle(SKETCH010_R)
    extrude(amount=-POCKET008_DEPTH, mode=Mode.SUBTRACT)

    # Chamfer001
    chamfer001_edges = [part.edges().sort_by_distance(p)[0] for p in [
        (77.4, 0, 21.2),
        (77.4, 9.5, 42.4),
        (-77.4, 0, 21.2),
        (-77.4, 9.5, 42.4),
        (0, 0, 42.4),
    ]]
    chamfer(chamfer001_edges, length=CHAMFER001_SIZE)

    # Chamfer002
    chamfer002_edges = [part.edges().sort_by_distance(p)[0] for p in [
        (-76.4, 18.5, 41.4),
        (76.4, 18.5, 41.4),
    ]]
    chamfer(chamfer002_edges, length=CHAMFER002_SIZE)


solid = part.part
